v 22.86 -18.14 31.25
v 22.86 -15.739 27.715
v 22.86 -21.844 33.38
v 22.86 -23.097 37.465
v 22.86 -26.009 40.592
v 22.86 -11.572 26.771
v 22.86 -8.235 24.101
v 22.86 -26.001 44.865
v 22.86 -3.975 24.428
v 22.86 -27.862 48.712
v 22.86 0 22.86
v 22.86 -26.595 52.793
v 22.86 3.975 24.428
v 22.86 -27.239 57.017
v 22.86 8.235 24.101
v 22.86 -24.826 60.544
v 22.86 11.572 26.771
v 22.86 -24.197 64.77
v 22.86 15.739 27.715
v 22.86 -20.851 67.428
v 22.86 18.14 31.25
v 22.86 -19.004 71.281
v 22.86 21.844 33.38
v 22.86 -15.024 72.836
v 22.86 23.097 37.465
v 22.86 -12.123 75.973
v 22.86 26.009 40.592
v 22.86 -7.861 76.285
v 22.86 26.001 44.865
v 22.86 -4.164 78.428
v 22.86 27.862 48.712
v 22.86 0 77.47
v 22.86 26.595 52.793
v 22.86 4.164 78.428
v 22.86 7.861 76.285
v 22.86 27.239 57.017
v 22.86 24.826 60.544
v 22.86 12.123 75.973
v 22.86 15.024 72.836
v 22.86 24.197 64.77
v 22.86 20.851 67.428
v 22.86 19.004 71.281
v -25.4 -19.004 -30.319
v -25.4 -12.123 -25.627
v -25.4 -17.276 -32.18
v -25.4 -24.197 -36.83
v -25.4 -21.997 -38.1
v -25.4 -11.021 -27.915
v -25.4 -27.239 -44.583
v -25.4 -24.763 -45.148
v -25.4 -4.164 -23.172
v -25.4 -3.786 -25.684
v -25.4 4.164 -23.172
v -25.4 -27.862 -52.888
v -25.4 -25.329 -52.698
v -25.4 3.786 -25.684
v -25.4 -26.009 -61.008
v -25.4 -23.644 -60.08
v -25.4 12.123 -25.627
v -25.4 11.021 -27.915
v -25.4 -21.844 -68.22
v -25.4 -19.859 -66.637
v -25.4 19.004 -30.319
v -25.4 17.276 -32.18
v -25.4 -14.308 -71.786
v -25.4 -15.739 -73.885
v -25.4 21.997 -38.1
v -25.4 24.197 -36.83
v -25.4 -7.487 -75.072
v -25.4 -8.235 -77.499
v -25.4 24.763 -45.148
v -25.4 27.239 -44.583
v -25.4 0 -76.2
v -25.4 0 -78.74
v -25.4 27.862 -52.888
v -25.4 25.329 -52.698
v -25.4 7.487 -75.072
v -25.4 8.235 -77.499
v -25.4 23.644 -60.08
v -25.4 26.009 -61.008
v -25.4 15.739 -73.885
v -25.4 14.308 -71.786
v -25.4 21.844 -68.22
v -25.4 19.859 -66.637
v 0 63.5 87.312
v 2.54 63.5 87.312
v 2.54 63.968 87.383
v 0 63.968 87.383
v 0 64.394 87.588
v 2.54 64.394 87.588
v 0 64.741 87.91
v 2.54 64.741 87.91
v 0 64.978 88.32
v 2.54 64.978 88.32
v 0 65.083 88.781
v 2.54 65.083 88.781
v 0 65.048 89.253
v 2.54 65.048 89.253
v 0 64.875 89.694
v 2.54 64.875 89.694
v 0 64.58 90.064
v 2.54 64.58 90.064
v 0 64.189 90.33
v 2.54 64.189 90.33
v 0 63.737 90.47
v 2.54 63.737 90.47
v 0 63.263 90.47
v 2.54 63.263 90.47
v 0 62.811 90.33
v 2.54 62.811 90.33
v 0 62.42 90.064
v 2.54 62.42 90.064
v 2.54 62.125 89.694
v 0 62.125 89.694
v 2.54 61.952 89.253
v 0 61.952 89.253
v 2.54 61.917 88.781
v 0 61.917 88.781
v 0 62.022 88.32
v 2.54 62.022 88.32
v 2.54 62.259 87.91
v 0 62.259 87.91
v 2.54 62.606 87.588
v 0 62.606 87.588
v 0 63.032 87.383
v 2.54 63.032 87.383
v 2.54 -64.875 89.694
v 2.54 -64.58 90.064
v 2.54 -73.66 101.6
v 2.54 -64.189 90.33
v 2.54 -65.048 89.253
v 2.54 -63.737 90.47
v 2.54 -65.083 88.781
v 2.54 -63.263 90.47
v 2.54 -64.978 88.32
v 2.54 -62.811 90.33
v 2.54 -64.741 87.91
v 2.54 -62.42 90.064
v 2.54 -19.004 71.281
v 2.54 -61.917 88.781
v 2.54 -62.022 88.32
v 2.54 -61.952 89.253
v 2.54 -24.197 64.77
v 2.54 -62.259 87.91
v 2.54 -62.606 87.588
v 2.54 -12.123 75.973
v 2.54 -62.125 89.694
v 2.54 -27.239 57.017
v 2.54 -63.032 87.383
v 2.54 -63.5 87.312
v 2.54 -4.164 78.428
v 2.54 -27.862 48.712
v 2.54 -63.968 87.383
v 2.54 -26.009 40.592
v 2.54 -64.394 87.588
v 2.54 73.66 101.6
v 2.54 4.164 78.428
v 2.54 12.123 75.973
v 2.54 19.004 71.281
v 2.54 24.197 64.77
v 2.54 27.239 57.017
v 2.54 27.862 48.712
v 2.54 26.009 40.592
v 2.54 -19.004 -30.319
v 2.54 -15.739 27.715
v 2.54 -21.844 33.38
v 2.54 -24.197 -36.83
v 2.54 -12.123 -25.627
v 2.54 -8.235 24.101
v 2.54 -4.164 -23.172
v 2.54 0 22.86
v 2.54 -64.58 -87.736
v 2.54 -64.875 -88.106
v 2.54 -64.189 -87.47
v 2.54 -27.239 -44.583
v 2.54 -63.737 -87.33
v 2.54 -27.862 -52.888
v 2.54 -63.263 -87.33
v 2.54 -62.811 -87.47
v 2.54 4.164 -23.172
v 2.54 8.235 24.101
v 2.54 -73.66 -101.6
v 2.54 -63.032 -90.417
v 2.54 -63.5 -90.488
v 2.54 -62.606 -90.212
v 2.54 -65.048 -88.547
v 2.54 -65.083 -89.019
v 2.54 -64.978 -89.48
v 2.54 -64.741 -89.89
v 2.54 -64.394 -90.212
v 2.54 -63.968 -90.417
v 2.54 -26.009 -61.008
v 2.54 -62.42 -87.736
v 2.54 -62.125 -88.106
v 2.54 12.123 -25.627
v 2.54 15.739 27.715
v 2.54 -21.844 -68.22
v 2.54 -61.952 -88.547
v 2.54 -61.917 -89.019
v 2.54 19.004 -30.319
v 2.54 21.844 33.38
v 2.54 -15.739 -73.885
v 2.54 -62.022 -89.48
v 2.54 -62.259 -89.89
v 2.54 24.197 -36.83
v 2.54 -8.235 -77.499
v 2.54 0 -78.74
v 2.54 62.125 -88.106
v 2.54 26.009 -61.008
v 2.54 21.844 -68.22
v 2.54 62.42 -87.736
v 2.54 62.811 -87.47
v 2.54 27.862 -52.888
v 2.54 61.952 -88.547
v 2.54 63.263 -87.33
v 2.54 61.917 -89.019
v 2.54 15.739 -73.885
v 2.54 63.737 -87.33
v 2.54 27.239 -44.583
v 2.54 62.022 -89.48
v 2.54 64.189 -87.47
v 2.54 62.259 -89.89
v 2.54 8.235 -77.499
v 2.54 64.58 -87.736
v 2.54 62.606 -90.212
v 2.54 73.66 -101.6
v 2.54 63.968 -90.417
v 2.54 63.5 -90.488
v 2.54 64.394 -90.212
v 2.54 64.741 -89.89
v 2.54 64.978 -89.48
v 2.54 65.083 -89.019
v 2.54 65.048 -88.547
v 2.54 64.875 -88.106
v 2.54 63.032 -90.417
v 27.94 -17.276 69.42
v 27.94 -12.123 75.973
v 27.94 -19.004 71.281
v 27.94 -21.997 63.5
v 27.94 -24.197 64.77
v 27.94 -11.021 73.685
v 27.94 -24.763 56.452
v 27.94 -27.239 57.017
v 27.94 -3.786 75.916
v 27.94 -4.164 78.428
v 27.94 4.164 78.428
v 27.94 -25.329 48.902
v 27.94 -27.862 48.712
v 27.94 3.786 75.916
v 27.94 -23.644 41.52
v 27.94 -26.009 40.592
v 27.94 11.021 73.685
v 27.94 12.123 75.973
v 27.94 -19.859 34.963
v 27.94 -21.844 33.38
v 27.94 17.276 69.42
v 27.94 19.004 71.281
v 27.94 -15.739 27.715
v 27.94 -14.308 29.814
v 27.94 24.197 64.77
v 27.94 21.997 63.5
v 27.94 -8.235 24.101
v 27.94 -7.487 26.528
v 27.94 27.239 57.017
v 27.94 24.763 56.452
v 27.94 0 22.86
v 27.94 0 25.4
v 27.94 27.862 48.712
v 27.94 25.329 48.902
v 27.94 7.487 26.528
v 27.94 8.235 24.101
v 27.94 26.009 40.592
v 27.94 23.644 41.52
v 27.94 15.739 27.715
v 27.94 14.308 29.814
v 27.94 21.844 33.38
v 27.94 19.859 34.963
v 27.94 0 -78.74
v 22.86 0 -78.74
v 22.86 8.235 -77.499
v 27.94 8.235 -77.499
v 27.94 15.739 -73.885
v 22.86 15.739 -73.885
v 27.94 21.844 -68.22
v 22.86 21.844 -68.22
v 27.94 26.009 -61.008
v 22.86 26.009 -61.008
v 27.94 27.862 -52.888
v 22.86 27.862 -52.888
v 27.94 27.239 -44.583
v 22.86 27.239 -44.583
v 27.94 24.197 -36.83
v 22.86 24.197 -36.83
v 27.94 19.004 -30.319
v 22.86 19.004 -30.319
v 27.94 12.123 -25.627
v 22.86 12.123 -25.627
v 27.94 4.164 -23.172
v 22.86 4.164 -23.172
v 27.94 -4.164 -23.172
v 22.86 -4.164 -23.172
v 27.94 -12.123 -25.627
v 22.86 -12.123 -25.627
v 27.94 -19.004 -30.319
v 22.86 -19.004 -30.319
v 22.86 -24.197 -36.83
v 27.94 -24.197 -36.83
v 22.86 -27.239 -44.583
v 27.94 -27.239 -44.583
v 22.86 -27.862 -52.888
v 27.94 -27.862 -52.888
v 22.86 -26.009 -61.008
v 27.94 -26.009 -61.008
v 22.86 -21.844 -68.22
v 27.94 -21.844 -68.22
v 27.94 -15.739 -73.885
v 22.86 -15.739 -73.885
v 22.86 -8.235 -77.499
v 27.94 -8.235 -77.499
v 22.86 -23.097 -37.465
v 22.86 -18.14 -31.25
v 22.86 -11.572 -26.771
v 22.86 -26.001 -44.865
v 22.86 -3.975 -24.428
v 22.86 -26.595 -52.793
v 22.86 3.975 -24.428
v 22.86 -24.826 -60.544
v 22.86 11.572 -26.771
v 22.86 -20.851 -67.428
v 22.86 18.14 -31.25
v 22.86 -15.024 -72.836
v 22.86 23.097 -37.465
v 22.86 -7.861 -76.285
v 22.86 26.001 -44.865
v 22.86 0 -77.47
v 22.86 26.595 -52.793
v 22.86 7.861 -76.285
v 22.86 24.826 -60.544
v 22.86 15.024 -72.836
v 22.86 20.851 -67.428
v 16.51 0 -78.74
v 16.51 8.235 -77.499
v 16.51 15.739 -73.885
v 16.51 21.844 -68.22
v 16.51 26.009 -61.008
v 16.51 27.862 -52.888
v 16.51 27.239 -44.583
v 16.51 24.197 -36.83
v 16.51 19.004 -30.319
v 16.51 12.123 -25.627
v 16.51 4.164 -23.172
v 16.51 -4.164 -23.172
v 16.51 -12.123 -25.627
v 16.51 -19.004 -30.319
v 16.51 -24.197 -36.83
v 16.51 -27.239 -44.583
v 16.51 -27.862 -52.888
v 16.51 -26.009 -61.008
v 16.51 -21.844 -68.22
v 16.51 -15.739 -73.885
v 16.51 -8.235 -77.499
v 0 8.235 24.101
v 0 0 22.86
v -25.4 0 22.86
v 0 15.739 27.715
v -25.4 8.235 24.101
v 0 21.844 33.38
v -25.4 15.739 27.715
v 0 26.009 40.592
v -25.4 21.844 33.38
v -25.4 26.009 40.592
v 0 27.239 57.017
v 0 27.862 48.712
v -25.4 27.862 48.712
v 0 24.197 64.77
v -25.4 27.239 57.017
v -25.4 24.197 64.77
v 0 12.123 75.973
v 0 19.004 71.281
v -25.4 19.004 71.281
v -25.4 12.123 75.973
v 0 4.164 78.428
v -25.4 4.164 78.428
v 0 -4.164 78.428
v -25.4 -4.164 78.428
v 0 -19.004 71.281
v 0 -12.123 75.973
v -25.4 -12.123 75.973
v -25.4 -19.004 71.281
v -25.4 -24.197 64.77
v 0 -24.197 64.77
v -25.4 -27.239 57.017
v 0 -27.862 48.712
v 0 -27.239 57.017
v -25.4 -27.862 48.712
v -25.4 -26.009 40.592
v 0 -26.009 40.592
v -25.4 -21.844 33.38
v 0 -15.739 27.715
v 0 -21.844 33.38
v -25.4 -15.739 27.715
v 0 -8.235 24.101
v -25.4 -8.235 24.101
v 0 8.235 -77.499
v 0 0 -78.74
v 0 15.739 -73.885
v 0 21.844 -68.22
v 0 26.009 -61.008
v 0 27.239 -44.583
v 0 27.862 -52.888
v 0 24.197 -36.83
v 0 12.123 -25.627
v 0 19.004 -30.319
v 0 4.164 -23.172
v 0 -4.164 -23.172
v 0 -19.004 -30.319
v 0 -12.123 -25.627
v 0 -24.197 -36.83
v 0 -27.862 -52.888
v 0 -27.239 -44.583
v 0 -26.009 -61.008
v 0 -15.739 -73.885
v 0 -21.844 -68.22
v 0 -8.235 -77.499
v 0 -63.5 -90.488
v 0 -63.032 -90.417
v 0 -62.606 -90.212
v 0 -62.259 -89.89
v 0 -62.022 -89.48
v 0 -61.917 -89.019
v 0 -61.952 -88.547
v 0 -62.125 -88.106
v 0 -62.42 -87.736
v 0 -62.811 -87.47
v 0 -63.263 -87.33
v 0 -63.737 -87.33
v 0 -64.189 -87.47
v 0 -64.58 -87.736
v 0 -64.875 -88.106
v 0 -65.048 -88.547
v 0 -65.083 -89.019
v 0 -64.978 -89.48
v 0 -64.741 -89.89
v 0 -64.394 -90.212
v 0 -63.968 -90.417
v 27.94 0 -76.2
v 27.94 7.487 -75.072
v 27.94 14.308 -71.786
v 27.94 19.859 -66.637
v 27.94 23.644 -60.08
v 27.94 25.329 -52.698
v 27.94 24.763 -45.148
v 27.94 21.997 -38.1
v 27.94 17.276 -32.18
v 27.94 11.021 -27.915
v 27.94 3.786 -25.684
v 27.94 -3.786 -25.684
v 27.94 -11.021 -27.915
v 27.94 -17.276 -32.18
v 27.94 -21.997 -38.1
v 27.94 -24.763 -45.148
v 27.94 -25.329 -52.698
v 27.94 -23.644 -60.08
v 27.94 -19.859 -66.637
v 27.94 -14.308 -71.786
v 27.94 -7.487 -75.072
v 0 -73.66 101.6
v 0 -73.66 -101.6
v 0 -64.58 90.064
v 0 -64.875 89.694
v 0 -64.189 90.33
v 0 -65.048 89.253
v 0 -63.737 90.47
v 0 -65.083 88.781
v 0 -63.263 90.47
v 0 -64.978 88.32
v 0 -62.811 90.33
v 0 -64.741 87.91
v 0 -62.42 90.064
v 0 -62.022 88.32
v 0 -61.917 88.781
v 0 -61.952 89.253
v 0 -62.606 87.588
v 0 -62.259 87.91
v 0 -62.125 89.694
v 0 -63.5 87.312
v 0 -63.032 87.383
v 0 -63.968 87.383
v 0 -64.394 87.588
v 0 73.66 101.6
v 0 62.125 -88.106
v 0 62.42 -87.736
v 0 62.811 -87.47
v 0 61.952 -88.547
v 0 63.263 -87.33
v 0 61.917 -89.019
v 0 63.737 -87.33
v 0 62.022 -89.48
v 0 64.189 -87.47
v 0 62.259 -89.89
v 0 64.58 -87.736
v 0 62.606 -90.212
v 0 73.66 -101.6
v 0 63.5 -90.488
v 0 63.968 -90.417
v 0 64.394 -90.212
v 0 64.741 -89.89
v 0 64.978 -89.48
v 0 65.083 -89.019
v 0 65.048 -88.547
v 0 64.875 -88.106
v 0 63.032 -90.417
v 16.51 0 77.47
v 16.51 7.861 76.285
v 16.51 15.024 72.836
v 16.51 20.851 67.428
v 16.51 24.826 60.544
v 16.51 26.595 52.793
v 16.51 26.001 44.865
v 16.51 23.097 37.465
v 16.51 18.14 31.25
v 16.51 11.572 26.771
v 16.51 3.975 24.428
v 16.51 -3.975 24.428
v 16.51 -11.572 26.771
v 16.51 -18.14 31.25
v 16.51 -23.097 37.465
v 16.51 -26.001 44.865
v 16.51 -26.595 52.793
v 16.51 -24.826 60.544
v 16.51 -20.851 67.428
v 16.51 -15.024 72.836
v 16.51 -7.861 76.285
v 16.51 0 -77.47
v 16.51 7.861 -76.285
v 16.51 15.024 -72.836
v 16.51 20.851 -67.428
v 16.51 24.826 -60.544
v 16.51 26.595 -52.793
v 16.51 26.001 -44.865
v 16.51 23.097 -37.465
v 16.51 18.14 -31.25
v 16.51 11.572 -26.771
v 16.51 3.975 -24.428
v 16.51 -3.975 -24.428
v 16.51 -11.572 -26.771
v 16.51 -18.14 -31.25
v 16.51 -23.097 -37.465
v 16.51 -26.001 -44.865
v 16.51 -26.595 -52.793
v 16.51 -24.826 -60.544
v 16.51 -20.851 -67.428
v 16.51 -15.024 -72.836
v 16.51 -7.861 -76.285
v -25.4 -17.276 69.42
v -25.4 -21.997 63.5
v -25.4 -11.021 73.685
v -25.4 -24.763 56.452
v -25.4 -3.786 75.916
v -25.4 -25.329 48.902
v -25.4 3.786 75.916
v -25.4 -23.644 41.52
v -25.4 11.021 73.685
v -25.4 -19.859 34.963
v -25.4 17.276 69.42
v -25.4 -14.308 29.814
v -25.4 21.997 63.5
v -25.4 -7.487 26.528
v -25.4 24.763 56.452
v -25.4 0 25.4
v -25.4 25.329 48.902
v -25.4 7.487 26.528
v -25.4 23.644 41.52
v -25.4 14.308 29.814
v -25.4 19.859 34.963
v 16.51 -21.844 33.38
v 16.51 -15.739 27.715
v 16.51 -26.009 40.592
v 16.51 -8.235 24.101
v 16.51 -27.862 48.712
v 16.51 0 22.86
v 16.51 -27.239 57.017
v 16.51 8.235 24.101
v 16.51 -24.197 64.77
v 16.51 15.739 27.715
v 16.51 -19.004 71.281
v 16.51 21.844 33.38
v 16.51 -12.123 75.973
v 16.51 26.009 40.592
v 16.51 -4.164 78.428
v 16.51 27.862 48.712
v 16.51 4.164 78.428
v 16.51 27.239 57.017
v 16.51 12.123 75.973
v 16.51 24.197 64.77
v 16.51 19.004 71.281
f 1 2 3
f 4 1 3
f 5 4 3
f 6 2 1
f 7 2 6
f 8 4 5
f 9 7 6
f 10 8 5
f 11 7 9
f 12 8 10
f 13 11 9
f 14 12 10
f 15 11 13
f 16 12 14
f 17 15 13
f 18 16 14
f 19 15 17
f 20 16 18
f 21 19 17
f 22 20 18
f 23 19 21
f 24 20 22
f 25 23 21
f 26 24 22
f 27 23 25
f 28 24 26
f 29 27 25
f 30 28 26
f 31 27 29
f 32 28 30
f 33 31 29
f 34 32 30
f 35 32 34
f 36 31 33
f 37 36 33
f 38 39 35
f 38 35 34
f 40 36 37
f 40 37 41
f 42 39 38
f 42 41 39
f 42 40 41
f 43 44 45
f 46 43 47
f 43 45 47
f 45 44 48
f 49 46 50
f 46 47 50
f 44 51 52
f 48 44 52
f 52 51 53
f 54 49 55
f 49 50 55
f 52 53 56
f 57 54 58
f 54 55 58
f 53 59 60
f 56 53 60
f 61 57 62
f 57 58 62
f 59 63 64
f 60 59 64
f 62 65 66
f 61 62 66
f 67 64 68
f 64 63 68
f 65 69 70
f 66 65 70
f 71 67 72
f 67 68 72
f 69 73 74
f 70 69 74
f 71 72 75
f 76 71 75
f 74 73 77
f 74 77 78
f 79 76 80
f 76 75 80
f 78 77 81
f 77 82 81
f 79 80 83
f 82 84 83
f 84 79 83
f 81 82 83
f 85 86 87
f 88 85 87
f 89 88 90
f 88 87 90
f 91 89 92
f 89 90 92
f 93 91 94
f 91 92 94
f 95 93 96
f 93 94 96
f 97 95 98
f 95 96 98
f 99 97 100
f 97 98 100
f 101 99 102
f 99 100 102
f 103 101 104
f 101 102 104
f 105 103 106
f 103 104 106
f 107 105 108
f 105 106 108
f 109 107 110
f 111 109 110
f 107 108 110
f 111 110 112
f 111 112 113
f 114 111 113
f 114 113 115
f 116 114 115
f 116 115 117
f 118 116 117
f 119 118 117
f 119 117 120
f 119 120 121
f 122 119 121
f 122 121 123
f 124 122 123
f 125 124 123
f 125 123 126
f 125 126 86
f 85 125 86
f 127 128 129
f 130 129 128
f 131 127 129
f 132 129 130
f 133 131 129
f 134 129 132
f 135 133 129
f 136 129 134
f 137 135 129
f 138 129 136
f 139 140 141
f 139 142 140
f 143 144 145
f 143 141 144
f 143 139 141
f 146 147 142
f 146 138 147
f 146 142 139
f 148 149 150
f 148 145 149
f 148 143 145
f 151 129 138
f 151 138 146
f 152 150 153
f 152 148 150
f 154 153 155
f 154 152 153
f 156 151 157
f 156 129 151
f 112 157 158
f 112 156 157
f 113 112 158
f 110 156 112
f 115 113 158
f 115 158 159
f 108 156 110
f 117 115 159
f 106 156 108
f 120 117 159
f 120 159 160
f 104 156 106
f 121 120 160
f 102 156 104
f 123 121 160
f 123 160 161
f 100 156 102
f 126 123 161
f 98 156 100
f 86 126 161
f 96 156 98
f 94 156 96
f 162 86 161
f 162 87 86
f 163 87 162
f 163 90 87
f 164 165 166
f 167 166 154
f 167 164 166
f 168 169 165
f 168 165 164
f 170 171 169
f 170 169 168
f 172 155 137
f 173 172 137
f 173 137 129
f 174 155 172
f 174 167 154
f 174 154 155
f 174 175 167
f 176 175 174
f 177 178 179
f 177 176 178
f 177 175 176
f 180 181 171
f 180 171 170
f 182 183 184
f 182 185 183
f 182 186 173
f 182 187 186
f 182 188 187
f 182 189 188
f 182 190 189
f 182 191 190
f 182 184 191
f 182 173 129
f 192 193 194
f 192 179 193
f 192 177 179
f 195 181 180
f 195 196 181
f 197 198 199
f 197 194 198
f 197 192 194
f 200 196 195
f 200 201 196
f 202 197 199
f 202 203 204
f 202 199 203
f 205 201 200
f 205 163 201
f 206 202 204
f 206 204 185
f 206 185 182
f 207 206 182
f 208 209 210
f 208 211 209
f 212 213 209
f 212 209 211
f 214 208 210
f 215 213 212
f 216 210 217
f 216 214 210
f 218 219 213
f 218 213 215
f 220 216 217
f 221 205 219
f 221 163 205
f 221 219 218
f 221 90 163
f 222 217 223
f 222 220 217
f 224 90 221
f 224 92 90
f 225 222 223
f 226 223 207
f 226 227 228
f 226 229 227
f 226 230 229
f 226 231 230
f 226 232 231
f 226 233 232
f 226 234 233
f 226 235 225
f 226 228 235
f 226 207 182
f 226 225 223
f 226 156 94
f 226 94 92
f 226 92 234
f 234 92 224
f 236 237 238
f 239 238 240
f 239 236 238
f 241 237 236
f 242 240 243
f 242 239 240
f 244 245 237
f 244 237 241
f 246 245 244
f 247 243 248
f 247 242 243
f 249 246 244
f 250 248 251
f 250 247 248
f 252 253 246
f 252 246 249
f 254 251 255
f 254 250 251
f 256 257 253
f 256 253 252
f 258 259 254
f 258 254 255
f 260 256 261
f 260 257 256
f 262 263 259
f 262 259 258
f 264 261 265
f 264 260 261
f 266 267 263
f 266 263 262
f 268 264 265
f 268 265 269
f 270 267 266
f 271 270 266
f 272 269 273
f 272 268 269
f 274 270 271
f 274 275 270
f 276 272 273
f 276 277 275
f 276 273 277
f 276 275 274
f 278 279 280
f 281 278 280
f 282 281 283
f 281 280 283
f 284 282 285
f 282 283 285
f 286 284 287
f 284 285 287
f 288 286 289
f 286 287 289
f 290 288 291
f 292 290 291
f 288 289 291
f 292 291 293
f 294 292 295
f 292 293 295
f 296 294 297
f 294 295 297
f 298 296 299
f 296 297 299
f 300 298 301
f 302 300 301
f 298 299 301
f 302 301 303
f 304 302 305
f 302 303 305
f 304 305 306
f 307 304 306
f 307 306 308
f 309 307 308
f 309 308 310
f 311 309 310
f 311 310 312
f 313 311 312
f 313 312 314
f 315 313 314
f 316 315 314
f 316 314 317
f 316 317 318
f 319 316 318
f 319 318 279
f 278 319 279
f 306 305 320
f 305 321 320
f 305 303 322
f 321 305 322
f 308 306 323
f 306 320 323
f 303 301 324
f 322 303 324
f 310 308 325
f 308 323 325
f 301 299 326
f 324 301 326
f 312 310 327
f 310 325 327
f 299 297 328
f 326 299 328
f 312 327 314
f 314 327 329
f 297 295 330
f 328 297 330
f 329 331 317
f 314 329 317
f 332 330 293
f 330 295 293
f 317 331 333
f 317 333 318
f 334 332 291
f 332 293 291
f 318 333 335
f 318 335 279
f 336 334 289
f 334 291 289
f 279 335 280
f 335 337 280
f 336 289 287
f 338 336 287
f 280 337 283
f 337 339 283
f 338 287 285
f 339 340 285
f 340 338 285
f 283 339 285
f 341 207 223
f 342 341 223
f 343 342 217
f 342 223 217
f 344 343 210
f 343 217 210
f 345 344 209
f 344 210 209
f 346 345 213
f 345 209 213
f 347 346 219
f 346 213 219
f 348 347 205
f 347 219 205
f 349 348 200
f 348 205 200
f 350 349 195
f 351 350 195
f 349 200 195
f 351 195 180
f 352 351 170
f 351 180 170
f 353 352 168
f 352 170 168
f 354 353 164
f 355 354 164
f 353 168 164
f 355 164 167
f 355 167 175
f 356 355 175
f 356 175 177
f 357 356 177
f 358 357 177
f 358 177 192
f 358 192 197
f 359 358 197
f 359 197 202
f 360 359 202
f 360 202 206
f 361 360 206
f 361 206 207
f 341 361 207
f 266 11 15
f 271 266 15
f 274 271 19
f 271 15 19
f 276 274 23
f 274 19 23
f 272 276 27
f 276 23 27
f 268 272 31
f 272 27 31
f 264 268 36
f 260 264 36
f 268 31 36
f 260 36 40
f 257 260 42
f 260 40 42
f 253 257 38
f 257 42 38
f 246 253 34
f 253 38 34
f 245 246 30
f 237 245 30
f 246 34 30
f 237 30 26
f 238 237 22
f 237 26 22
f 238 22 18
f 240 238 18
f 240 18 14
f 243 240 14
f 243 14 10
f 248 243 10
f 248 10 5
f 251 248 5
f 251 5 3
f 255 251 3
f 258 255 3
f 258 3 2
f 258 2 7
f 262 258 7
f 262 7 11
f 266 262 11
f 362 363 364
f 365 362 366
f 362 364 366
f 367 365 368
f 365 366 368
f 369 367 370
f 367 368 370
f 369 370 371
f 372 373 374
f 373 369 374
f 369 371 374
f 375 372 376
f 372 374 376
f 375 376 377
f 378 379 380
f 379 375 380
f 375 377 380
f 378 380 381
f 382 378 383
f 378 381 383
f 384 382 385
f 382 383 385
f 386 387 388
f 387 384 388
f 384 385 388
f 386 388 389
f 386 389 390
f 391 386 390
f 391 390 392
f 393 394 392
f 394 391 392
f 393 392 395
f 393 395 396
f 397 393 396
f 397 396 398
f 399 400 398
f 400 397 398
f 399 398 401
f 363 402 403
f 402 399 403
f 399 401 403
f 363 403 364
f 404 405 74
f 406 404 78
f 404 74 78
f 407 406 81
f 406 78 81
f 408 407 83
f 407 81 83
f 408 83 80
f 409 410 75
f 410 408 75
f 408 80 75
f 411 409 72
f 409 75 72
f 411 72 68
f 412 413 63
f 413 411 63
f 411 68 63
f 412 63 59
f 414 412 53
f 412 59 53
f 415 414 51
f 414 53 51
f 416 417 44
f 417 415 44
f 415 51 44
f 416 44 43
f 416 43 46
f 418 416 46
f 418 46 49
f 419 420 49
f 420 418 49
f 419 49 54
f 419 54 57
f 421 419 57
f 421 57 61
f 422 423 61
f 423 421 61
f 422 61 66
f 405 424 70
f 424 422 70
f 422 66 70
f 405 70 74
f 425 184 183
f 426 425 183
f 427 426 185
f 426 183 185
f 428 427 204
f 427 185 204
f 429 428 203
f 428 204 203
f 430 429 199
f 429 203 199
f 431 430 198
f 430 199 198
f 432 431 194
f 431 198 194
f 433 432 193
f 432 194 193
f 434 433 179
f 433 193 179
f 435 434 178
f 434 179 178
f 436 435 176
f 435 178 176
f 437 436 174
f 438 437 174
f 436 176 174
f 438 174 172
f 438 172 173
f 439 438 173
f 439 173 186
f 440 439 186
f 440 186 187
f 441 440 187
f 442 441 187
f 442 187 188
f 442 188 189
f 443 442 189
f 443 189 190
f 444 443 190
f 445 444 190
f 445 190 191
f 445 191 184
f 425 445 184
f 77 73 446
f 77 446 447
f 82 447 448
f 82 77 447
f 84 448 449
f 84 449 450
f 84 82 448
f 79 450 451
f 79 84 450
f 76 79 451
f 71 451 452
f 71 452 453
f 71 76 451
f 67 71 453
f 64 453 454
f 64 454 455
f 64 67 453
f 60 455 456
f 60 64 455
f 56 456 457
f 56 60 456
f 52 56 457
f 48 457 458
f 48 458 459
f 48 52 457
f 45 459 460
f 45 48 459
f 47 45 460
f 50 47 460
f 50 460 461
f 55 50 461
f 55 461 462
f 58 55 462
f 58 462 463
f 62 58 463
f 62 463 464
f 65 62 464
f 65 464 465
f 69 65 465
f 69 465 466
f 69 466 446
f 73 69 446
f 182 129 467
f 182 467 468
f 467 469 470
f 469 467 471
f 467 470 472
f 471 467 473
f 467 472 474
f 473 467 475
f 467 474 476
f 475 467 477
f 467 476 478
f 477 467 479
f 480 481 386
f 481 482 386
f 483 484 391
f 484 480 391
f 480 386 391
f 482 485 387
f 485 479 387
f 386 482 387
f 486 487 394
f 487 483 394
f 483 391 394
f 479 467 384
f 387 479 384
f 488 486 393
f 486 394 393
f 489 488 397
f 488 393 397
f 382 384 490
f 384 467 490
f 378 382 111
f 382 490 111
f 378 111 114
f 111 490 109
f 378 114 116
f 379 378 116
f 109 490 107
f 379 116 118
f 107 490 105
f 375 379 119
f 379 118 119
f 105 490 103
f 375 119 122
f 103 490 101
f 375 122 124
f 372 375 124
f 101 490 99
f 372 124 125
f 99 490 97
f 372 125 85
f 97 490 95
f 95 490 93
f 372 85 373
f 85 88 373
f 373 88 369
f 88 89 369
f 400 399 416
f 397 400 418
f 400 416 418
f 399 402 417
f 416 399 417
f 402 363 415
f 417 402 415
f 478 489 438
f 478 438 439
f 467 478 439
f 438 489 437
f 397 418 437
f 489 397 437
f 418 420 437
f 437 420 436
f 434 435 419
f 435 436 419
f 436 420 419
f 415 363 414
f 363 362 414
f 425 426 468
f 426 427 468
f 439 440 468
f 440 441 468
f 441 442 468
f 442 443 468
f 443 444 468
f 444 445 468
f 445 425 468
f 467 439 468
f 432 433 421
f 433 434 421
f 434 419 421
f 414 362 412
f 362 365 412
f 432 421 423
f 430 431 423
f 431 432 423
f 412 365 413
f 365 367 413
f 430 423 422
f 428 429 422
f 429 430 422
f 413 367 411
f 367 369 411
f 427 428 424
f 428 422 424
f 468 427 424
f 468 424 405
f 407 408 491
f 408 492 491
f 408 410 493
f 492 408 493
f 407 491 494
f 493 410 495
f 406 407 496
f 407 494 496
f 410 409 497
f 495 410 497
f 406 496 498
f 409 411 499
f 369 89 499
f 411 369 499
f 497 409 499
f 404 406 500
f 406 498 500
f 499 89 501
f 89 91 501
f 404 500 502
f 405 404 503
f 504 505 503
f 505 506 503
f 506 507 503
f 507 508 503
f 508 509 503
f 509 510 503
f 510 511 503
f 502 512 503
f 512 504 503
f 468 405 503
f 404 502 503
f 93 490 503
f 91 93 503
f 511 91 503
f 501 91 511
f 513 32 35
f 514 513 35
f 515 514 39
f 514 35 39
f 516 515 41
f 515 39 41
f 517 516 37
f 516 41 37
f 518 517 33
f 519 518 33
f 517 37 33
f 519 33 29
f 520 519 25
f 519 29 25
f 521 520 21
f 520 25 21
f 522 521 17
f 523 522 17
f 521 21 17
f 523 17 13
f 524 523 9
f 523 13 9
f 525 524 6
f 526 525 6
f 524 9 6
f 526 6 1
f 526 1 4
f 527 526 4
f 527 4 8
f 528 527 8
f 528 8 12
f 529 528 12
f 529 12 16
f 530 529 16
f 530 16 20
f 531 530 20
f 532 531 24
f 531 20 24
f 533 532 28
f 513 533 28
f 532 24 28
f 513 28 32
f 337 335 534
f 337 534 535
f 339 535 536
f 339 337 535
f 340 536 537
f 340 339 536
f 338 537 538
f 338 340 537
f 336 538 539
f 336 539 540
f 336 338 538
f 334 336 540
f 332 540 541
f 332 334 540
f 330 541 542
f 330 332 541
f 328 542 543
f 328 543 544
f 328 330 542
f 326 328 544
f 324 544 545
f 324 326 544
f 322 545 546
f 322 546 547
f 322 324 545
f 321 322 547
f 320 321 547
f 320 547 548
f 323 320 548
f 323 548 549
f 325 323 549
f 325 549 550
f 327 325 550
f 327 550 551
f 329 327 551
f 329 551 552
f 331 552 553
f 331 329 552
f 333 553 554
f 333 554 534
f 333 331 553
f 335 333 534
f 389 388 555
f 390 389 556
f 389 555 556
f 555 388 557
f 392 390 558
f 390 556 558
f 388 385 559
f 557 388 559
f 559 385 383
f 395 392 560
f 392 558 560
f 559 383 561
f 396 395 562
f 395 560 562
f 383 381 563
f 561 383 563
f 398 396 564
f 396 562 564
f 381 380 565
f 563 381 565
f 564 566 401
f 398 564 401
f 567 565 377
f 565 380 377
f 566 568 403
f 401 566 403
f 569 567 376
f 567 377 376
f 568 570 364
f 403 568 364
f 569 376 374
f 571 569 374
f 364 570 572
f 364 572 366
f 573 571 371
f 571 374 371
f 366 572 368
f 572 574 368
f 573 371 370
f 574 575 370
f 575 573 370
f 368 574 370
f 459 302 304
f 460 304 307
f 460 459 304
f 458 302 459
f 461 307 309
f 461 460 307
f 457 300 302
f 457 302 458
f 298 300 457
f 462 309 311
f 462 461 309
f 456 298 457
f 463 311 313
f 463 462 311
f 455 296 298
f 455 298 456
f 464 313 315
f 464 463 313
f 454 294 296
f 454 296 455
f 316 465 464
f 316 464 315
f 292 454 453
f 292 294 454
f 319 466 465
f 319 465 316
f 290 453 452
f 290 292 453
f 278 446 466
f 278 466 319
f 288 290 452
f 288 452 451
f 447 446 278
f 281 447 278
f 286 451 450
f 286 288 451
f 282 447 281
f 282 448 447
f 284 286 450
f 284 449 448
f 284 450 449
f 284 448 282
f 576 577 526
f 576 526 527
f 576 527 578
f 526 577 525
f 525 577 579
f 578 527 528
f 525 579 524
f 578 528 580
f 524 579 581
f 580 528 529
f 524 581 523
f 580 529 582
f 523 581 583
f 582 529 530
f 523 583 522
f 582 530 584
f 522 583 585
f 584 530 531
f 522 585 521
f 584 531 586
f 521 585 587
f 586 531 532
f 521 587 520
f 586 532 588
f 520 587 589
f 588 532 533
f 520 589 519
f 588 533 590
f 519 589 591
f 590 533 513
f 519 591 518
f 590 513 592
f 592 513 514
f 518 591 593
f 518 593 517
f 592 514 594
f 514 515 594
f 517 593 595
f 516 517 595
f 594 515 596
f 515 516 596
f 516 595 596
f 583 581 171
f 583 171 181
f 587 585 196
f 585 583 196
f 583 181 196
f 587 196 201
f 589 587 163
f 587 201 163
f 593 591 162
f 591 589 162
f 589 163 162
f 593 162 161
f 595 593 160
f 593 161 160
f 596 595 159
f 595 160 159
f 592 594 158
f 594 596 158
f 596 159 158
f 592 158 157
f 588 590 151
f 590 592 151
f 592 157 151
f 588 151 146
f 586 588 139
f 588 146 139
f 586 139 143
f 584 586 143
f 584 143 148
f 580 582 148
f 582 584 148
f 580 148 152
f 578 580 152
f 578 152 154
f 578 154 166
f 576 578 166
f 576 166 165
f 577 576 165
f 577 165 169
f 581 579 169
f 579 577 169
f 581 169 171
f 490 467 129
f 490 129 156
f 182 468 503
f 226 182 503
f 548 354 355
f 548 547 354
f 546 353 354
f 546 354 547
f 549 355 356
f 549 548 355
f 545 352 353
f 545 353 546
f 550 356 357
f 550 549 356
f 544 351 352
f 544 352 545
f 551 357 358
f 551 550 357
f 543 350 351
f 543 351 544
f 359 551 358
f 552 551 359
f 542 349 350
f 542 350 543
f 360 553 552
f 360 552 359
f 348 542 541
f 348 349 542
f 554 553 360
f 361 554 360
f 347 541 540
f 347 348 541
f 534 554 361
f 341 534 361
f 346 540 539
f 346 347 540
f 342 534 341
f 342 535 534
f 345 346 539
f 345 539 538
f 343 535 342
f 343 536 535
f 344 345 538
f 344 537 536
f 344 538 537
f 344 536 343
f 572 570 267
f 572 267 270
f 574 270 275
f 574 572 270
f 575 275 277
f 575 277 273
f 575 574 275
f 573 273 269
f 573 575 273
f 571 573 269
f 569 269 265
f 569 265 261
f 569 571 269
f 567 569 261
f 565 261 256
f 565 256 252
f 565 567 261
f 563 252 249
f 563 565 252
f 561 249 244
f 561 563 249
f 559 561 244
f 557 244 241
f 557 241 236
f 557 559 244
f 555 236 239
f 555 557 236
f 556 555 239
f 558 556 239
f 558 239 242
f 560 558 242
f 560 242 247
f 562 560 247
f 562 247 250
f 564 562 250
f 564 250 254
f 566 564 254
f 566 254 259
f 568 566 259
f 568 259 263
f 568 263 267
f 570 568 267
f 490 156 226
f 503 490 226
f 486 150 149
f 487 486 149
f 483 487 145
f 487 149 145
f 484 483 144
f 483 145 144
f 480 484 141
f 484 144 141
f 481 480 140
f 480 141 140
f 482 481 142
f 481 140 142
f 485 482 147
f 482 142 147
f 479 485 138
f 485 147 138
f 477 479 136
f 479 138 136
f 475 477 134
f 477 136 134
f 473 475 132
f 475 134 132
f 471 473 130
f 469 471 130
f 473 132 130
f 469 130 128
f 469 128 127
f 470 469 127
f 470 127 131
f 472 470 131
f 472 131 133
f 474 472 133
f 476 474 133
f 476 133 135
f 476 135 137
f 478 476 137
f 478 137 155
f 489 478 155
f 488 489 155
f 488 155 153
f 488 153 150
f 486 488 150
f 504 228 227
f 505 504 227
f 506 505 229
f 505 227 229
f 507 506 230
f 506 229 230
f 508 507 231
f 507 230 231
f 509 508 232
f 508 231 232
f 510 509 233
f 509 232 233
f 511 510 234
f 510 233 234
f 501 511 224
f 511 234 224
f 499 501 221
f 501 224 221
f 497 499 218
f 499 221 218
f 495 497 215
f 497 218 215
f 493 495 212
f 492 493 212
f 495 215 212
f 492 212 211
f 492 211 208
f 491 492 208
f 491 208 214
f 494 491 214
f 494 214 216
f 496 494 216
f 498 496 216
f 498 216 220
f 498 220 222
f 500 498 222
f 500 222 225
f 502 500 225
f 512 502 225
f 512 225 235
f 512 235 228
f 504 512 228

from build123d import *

# Parameters (mm, degrees)
SKETCH1_W                = 203.2
SKETCH1_H                = 152.4
SKETCH1_R                = 25.4
BOSS_EXTRUDE1_DEPTH      = 2.54
BOSS_EXTRUDE2_DEPTH      = 25.4
BOSS_EXTRUDE2_DEPTH_BACK = 27.94
SKETCH2_R                = 27.94
SKETCH2_R_2              = 25.4
CUT_EXTRUDE1_START       = -5.08
SKETCH3_R                = 27.94
SKETCH3_R_2              = 26.67
CUT_EXTRUDE1_DEPTH       = 6.35
SKETCH4_R                = 1.5875
CUT_EXTRUDE2_DEPTH       = 131.037085479
SKETCH5_W                = 203.2
SKETCH5_H                = 2.54
CUT_EXTRUDE3_DEPTH       = 131.037085479


with BuildPart() as part:
    # Sketch1 → Boss-Extrude1 (new body)
    with BuildSketch(Plane(origin=(0, 0, 0), x_dir=(0, 0, -1), z_dir=(1, 0, 0))):
        Rectangle(SKETCH1_W, SKETCH1_H)
        with Locations((50.8, 0)):
            Circle(SKETCH1_R, mode=Mode.SUBTRACT)
        with Locations((-50.8, 0)):
            Circle(SKETCH1_R, mode=Mode.SUBTRACT)
    extrude(amount=BOSS_EXTRUDE1_DEPTH)

    # Sketch2 → Boss-Extrude2 (add, two sides: drawn at the far end of the back side and taken through both)
    # profile 1 of 2: a face of its own
    with BuildSketch(Plane(origin=(2.54, 0, 0), x_dir=(0, 0, -1), z_dir=(1, 0, 0)).offset(-BOSS_EXTRUDE2_DEPTH_BACK)):
        with Locations((-50.8, 0)):
            Circle(SKETCH2_R)
        with Locations((-50.8, 0)):
            Circle(SKETCH2_R_2, mode=Mode.SUBTRACT)
    # profile 2 of 2: a face of its own
    with BuildSketch(Plane(origin=(2.54, 0, 0), x_dir=(0, 0, -1), z_dir=(1, 0, 0)).offset(-BOSS_EXTRUDE2_DEPTH_BACK)):
        with Locations((50.8, 0)):
            Circle(SKETCH2_R)
        with Locations((50.8, 0)):
            Circle(SKETCH2_R_2, mode=Mode.SUBTRACT)
    extrude(amount=BOSS_EXTRUDE2_DEPTH + BOSS_EXTRUDE2_DEPTH_BACK)

    # Sketch3 → Cut-Extrude1 (cut)
    with BuildSketch(Plane(origin=(27.94, 0, 0), x_dir=(0, 0, -1), z_dir=(1, 0, 0)).offset(CUT_EXTRUDE1_START)):
        with Locations((50.8, 0)):
            Circle(SKETCH3_R)
        with Locations((50.8, 0)):
            Circle(SKETCH3_R_2, mode=Mode.SUBTRACT)
    cut_extrude1 = extrude(amount=-CUT_EXTRUDE1_DEPTH, mode=Mode.SUBTRACT)

    # Mirror1: Cut-Extrude1 across plane
    add(cut_extrude1.mirror(Plane.XY), mode=Mode.SUBTRACT)

    # Sketch4 → Cut-Extrude2 (cut, through all)
    with BuildSketch(Plane(origin=(2.54, 0, 0), x_dir=(0, 0, -1), z_dir=(1, 0, 0))):
        with Locations((-88.9, 63.5)):
            Circle(SKETCH4_R)
        with Locations((88.9, 63.5)):
            Circle(SKETCH4_R)
        with Locations((88.9, -63.5)):
            Circle(SKETCH4_R)
        with Locations((-88.9, -63.5)):
            Circle(SKETCH4_R)
    extrude(amount=-CUT_EXTRUDE2_DEPTH, mode=Mode.SUBTRACT)

    # Sketch5 → Cut-Extrude3 (cut, through all)
    with BuildSketch(Plane(origin=(2.54, 0, 0), x_dir=(0, 0, -1), z_dir=(1, 0, 0))):
        with Locations((0, -74.93)):
            Rectangle(SKETCH5_W, SKETCH5_H)
        with Locations((0, 74.93)):
            Rectangle(SKETCH5_W, SKETCH5_H)
    extrude(amount=-CUT_EXTRUDE3_DEPTH, mode=Mode.SUBTRACT)


solid = part.part
